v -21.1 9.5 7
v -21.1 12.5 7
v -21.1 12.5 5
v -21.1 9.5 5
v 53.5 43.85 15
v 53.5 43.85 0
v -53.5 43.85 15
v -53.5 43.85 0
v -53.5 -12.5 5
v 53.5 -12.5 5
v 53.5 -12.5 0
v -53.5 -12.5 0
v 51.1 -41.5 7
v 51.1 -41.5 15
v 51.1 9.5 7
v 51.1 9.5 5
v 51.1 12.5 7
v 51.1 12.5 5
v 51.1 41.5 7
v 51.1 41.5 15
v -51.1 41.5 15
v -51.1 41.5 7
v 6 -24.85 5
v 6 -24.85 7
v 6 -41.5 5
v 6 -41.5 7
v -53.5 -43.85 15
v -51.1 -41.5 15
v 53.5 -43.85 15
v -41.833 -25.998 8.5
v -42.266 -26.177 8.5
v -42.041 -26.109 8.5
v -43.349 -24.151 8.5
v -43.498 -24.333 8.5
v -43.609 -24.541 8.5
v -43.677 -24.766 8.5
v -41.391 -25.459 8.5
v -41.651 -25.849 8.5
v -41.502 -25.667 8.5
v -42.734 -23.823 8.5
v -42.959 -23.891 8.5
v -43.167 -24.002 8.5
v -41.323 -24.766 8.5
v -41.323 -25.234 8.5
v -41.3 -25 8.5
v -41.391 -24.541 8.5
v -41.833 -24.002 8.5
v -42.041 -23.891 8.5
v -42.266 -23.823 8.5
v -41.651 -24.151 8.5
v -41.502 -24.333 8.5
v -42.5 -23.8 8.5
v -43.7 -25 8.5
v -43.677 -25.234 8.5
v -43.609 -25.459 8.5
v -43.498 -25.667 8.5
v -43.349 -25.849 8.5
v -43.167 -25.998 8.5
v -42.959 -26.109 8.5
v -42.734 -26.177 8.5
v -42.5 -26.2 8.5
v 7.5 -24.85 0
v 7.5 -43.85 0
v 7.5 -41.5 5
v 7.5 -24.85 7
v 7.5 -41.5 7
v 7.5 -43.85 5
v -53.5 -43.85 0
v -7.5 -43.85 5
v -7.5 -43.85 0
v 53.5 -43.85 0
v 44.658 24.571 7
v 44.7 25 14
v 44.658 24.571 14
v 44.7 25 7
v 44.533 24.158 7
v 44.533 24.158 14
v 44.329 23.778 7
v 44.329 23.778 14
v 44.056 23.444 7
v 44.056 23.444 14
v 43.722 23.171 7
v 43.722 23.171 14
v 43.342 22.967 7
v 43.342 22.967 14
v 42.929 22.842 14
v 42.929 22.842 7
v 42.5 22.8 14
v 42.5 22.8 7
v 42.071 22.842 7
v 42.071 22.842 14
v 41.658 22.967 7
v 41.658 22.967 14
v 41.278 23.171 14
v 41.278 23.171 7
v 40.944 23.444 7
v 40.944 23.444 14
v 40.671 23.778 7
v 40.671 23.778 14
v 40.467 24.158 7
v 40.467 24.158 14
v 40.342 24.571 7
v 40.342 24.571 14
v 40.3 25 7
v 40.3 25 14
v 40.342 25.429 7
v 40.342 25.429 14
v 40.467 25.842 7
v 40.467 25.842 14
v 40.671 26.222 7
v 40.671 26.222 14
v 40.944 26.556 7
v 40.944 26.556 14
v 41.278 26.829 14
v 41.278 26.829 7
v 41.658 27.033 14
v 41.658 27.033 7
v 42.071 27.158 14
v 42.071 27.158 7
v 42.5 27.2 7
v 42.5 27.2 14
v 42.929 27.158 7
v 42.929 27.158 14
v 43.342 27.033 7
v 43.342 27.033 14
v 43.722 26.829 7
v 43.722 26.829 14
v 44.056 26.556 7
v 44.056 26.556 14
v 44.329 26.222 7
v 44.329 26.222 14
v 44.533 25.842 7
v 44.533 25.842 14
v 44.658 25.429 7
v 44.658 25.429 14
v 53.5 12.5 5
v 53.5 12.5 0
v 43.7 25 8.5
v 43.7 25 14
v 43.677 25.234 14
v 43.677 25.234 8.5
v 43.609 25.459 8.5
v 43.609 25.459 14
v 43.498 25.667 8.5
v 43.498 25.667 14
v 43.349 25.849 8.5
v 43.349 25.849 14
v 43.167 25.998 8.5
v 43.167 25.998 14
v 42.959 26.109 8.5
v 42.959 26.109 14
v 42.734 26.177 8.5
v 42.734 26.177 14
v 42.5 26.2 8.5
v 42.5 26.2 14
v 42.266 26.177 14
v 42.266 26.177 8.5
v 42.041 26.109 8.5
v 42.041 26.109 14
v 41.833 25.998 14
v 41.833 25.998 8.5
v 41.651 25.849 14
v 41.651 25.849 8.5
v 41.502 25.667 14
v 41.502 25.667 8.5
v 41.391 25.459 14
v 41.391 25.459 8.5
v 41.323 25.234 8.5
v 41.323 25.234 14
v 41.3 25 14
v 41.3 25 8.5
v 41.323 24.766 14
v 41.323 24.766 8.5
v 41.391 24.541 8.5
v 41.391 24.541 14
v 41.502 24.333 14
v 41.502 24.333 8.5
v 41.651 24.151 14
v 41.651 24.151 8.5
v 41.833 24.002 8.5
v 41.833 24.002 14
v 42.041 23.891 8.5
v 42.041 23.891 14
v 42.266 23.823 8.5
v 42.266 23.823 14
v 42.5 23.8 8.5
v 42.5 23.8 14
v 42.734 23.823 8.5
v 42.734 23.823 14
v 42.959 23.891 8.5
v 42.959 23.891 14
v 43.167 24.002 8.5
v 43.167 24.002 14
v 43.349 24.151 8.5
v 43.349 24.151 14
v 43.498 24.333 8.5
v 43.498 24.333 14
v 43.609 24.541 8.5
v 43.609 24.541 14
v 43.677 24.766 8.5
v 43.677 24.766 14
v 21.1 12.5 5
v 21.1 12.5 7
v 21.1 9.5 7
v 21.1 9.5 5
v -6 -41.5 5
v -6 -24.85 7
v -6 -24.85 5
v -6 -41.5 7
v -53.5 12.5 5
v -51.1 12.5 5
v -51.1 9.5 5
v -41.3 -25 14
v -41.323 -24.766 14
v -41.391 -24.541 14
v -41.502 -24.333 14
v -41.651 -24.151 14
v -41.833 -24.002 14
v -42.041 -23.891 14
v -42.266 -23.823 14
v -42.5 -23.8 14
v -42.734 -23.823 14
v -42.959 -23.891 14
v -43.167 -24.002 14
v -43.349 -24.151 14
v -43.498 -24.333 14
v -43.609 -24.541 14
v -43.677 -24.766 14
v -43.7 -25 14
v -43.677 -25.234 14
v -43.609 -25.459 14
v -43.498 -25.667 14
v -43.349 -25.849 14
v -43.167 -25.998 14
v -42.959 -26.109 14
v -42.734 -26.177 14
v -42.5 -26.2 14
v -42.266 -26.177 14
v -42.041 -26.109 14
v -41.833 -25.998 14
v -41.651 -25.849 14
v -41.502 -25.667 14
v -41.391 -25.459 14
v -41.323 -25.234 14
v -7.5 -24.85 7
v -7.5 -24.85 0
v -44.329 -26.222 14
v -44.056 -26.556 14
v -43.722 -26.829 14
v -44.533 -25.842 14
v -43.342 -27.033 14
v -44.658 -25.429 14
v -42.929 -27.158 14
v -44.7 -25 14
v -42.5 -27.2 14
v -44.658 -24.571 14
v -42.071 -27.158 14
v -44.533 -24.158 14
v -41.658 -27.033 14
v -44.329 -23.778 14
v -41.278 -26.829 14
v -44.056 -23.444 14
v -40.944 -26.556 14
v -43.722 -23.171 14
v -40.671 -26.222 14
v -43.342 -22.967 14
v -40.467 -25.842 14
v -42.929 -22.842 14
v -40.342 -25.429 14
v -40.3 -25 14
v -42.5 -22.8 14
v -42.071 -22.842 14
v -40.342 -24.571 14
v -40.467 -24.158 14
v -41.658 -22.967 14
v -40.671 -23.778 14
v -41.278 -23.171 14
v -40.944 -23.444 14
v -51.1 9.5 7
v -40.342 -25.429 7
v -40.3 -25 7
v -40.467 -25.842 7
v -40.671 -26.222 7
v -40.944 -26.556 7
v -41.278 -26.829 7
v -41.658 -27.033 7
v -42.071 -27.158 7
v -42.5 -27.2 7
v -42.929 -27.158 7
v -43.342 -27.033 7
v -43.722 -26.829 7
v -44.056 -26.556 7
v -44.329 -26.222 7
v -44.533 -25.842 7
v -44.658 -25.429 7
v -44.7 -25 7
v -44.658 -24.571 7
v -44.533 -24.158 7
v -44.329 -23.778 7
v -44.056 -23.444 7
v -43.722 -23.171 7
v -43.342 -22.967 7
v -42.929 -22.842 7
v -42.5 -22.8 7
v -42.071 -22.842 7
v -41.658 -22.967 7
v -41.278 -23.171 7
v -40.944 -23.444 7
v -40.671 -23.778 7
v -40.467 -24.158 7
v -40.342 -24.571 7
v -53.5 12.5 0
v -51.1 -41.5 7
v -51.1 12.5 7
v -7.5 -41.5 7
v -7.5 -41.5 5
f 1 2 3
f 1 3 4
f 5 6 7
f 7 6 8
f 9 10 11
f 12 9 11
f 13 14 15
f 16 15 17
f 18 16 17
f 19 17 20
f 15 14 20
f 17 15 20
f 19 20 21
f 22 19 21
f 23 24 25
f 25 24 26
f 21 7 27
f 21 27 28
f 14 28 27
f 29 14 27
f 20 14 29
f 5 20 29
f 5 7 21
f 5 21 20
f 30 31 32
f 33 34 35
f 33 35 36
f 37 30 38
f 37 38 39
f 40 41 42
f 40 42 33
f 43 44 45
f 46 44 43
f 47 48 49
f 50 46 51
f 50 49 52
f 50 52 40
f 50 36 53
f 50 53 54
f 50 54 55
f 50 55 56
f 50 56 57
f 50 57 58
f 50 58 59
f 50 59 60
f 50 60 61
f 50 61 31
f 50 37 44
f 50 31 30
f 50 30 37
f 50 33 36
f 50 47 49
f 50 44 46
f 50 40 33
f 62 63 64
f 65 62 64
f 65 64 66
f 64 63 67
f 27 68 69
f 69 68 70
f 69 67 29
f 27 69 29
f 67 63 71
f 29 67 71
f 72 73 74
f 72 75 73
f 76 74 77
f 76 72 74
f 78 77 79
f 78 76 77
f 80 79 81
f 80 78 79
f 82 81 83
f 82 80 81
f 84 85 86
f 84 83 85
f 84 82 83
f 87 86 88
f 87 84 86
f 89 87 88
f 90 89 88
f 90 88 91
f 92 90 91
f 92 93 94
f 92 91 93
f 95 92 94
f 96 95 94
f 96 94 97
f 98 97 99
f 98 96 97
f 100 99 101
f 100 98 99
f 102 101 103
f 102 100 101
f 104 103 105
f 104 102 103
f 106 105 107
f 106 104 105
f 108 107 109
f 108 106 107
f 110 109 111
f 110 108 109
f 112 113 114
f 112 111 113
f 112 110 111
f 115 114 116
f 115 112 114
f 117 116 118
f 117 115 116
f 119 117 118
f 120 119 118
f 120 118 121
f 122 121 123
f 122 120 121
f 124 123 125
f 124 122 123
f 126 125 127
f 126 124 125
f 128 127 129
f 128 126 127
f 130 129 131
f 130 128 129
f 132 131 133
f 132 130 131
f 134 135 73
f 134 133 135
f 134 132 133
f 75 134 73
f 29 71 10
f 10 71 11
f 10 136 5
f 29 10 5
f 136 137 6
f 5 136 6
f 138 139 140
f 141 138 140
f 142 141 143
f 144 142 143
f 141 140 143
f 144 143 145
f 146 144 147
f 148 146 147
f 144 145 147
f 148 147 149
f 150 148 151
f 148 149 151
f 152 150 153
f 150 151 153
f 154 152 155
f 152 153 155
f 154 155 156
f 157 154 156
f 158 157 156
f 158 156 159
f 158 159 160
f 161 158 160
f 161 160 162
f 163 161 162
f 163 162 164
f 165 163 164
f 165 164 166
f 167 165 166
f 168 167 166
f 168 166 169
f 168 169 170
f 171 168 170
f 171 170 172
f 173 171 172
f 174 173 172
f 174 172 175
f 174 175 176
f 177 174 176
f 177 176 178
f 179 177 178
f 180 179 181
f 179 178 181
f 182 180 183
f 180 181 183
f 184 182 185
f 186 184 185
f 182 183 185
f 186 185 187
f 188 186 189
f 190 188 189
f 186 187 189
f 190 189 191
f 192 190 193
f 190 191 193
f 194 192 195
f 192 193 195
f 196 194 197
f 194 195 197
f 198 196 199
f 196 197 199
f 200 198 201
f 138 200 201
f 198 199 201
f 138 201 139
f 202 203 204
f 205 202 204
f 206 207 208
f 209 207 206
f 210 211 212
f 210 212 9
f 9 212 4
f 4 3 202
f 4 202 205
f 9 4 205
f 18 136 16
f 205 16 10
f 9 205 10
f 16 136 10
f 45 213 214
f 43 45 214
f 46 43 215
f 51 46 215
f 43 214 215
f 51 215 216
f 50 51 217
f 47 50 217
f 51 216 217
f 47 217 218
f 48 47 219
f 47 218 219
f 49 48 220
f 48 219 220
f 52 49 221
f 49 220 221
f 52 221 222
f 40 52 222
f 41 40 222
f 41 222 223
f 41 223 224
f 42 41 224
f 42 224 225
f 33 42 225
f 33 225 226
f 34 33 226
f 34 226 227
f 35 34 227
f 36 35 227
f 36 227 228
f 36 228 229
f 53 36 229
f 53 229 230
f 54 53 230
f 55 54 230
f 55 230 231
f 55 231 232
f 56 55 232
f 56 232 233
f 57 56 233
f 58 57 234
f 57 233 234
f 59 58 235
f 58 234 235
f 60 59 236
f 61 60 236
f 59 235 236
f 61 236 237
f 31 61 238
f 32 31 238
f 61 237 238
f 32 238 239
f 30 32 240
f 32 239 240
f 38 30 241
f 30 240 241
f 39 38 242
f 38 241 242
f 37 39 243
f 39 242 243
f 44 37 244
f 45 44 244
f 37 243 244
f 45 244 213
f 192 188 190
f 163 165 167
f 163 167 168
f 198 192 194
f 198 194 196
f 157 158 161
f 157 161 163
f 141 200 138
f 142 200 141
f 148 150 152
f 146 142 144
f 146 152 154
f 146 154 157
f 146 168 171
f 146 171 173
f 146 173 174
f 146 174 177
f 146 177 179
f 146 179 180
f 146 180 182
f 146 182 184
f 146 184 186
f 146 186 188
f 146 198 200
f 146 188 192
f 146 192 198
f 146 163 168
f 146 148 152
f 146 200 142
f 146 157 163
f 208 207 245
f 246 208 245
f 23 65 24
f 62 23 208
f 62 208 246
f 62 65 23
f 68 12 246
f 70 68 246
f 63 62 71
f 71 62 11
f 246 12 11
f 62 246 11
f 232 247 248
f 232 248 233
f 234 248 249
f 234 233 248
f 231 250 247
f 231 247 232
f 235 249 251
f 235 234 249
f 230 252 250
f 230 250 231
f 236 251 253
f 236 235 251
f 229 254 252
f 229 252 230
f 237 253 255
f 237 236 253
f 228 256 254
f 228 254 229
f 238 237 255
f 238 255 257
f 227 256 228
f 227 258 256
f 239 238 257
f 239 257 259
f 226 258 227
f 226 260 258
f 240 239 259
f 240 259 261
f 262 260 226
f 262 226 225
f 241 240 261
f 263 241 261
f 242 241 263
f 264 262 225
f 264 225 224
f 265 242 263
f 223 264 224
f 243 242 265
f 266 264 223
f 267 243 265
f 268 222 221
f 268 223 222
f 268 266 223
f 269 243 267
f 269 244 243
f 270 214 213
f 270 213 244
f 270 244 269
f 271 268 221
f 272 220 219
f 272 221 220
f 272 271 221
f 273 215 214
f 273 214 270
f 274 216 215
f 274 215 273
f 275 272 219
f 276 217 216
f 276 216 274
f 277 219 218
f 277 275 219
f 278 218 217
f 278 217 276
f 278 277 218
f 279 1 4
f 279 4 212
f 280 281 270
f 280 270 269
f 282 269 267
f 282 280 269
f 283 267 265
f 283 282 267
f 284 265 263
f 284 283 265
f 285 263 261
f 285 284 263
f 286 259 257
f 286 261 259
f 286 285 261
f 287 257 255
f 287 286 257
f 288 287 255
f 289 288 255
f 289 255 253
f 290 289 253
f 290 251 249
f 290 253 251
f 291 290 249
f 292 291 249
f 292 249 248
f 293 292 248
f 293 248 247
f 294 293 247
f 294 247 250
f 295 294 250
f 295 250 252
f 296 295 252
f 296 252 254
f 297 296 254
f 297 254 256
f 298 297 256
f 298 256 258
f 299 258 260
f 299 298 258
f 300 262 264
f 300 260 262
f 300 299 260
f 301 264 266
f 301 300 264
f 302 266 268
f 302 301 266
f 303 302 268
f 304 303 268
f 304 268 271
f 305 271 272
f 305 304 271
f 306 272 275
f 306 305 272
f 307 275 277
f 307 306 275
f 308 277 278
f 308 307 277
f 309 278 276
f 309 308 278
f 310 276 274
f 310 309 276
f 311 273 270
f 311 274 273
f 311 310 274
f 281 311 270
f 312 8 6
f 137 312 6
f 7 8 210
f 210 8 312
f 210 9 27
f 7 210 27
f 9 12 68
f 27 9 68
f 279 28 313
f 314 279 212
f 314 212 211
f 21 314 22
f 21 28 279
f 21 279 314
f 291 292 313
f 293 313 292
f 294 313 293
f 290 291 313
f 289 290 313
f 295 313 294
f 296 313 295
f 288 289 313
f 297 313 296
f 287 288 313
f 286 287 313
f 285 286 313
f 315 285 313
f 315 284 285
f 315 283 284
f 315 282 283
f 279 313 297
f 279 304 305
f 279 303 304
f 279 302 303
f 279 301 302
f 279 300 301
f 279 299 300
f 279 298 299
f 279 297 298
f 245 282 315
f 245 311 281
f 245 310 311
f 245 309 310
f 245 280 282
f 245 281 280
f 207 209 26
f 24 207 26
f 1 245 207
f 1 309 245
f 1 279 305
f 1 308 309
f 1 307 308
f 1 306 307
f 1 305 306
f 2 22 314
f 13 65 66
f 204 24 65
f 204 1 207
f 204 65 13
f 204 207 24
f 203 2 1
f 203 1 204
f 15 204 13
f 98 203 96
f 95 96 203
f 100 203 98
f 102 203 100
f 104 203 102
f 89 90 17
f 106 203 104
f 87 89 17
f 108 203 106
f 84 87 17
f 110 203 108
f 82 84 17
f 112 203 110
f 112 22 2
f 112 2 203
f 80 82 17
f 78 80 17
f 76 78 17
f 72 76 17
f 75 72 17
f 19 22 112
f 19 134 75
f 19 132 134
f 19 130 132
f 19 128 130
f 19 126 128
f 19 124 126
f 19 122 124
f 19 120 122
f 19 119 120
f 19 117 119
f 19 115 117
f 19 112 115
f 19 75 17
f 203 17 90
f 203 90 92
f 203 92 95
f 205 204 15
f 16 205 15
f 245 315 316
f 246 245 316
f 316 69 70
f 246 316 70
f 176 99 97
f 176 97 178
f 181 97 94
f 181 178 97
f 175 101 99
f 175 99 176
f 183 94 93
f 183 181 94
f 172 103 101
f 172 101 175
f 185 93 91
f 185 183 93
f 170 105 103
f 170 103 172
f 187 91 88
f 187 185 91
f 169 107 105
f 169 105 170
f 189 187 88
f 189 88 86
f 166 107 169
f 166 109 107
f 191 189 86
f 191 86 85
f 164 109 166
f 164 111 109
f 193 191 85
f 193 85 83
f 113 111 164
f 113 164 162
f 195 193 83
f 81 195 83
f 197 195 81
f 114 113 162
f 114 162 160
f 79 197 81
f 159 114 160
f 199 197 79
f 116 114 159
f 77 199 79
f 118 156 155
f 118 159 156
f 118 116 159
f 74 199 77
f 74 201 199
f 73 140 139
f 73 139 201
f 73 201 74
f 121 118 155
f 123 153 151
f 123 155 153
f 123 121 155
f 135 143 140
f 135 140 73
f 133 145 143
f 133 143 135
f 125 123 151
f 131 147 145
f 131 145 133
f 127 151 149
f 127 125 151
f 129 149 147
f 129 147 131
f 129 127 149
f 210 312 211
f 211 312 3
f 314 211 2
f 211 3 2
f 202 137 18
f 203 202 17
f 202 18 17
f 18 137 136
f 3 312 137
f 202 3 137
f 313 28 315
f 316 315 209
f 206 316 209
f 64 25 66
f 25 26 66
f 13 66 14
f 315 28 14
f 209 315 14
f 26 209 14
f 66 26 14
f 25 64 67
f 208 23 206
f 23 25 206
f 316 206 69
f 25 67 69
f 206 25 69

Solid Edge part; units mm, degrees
sketch "Sketch1" plane through (0, 0, 0) normal (0, 0, 1) x (1, 0, 0)
  line L0 (53.5, -43.85) -> (53.5, 43.85)
  line L1 (53.5, 43.85) -> (-53.5, 43.85)
  line L2 (-53.5, 43.85) -> (-53.5, -43.85)
  line L3 (-53.5, -43.85) -> (53.5, -43.85)
extrude "Protrusion1" add sketch "Sketch1" along normal blind 15
sketch "Sketch2" plane through (0, -43.85, 7.5) normal (0, -1, 0) x (1, 0, 0)
  line L0 (7.5, -2.5) -> (-7.5, -2.5)
  line L1 (-7.5, -2.5) -> (-7.5, -12.5)
  line L2 (-7.5, -12.5) -> (7.5, -12.5)
  line L3 (7.5, -12.5) -> (7.5, -2.5)
extrude "Corte_1" cut sketch "Sketch2" against normal blind 19
sketch "Sketch3" plane through (53.5, 0, 7.5) normal (1, 0, 0) x (0, 1, 0)
  line L0 (12.5, -2.5) -> (-12.5, -2.5)
  line L1 (-12.5, -2.5) -> (-12.5, -12.5)
  line L2 (-12.5, -12.5) -> (12.5, -12.5)
  line L3 (12.5, -12.5) -> (12.5, -2.5)
extrude "Corte_2" cut sketch "Sketch3" against normal blind 125.4573
sketch "Sketch4" plane through (0, 0, 15) normal (0, 0, 1) x (1, 0, 0)
  line L0 (51.1, -41.5) -> (51.1, 41.5)
  line L1 (51.1, 41.5) -> (-51.1, 41.5)
  line L2 (-51.1, 41.5) -> (-51.1, -41.5)
  line L3 (-51.1, -41.5) -> (51.1, -41.5)
extrude "Corte_3" cut sketch "Sketch4" against normal blind 8
sketch "Sketch5" plane through (0, 0, 7) normal (0, 0, 1) x (1, 0, 0)
  circle A0 centre (-42.5, -25) radius 2.2
  circle A1 centre (42.5, 25) radius 2.2
  dimension "D1" = 4.4
  dimension "D2" = 25
  dimension "D3" = 42.5
  dimension "D4" = 42.5
  dimension "D5" = 25
extrude "ProtrusiónExtruida_2" add sketch "Sketch5" along normal blind 7
sketch "Sketch6" plane through (0, 0, 7) normal (0, 0, 1) x (1, 0, 0)
  line L0 (7.5, -41.5) -> (7.5, -24.85)
  line L1 (7.5, -24.85) -> (6, -24.85)
  line L2 (6, -24.85) -> (6, -41.5)
  line L3 (6, -41.5) -> (7.5, -41.5)
  line L4 (-6, -24.85) -> (-6, -41.5)
  line L5 (-6, -41.5) -> (-7.5, -41.5)
  line L6 (-7.5, -41.5) -> (-7.5, -24.85)
  line L7 (-7.5, -24.85) -> (-6, -24.85)
  dimension "D1" = 1.5
  dimension "D2" = 1.5
extrude "Corte_4" cut sketch "Sketch6" against normal blind 21
sketch "Sketch7" plane through (0, 0, 7) normal (0, 0, 1) x (1, 0, 0)
  line L0 (-51.1, 12.5) -> (-21.1, 12.5)
  line L1 (-21.1, 12.5) -> (-21.1, 9.5)
  line L2 (-21.1, 9.5) -> (-51.1, 9.5)
  line L3 (-51.1, 9.5) -> (-51.1, 12.5)
  line L4 (51.1, 12.5) -> (21.1, 12.5)
  line L5 (21.1, 12.5) -> (21.1, 9.5)
  line L6 (21.1, 9.5) -> (51.1, 9.5)
  line L7 (51.1, 9.5) -> (51.1, 12.5)
  dimension "D1" = 30
  dimension "D2" = 30
  dimension "D3" = 3
  dimension "D4" = 3
extrude "Corte_5" cut sketch "Sketch7" against normal blind 84
sketch "Sketch8" plane through (-42.5, -25, 14) normal (0, 0, 1) x (1, 0, 0)
  circle A0 centre (0, 0) radius 1.2
  circle A1 centre (85, 50) radius 1.2
  dimension "D1" = 2.4
  dimension "D2" = 2.4
extrude "Corte_6" cut sketch "Sketch8" against normal blind 5.5
properties part number "Natanael Alc" material "PVC"
